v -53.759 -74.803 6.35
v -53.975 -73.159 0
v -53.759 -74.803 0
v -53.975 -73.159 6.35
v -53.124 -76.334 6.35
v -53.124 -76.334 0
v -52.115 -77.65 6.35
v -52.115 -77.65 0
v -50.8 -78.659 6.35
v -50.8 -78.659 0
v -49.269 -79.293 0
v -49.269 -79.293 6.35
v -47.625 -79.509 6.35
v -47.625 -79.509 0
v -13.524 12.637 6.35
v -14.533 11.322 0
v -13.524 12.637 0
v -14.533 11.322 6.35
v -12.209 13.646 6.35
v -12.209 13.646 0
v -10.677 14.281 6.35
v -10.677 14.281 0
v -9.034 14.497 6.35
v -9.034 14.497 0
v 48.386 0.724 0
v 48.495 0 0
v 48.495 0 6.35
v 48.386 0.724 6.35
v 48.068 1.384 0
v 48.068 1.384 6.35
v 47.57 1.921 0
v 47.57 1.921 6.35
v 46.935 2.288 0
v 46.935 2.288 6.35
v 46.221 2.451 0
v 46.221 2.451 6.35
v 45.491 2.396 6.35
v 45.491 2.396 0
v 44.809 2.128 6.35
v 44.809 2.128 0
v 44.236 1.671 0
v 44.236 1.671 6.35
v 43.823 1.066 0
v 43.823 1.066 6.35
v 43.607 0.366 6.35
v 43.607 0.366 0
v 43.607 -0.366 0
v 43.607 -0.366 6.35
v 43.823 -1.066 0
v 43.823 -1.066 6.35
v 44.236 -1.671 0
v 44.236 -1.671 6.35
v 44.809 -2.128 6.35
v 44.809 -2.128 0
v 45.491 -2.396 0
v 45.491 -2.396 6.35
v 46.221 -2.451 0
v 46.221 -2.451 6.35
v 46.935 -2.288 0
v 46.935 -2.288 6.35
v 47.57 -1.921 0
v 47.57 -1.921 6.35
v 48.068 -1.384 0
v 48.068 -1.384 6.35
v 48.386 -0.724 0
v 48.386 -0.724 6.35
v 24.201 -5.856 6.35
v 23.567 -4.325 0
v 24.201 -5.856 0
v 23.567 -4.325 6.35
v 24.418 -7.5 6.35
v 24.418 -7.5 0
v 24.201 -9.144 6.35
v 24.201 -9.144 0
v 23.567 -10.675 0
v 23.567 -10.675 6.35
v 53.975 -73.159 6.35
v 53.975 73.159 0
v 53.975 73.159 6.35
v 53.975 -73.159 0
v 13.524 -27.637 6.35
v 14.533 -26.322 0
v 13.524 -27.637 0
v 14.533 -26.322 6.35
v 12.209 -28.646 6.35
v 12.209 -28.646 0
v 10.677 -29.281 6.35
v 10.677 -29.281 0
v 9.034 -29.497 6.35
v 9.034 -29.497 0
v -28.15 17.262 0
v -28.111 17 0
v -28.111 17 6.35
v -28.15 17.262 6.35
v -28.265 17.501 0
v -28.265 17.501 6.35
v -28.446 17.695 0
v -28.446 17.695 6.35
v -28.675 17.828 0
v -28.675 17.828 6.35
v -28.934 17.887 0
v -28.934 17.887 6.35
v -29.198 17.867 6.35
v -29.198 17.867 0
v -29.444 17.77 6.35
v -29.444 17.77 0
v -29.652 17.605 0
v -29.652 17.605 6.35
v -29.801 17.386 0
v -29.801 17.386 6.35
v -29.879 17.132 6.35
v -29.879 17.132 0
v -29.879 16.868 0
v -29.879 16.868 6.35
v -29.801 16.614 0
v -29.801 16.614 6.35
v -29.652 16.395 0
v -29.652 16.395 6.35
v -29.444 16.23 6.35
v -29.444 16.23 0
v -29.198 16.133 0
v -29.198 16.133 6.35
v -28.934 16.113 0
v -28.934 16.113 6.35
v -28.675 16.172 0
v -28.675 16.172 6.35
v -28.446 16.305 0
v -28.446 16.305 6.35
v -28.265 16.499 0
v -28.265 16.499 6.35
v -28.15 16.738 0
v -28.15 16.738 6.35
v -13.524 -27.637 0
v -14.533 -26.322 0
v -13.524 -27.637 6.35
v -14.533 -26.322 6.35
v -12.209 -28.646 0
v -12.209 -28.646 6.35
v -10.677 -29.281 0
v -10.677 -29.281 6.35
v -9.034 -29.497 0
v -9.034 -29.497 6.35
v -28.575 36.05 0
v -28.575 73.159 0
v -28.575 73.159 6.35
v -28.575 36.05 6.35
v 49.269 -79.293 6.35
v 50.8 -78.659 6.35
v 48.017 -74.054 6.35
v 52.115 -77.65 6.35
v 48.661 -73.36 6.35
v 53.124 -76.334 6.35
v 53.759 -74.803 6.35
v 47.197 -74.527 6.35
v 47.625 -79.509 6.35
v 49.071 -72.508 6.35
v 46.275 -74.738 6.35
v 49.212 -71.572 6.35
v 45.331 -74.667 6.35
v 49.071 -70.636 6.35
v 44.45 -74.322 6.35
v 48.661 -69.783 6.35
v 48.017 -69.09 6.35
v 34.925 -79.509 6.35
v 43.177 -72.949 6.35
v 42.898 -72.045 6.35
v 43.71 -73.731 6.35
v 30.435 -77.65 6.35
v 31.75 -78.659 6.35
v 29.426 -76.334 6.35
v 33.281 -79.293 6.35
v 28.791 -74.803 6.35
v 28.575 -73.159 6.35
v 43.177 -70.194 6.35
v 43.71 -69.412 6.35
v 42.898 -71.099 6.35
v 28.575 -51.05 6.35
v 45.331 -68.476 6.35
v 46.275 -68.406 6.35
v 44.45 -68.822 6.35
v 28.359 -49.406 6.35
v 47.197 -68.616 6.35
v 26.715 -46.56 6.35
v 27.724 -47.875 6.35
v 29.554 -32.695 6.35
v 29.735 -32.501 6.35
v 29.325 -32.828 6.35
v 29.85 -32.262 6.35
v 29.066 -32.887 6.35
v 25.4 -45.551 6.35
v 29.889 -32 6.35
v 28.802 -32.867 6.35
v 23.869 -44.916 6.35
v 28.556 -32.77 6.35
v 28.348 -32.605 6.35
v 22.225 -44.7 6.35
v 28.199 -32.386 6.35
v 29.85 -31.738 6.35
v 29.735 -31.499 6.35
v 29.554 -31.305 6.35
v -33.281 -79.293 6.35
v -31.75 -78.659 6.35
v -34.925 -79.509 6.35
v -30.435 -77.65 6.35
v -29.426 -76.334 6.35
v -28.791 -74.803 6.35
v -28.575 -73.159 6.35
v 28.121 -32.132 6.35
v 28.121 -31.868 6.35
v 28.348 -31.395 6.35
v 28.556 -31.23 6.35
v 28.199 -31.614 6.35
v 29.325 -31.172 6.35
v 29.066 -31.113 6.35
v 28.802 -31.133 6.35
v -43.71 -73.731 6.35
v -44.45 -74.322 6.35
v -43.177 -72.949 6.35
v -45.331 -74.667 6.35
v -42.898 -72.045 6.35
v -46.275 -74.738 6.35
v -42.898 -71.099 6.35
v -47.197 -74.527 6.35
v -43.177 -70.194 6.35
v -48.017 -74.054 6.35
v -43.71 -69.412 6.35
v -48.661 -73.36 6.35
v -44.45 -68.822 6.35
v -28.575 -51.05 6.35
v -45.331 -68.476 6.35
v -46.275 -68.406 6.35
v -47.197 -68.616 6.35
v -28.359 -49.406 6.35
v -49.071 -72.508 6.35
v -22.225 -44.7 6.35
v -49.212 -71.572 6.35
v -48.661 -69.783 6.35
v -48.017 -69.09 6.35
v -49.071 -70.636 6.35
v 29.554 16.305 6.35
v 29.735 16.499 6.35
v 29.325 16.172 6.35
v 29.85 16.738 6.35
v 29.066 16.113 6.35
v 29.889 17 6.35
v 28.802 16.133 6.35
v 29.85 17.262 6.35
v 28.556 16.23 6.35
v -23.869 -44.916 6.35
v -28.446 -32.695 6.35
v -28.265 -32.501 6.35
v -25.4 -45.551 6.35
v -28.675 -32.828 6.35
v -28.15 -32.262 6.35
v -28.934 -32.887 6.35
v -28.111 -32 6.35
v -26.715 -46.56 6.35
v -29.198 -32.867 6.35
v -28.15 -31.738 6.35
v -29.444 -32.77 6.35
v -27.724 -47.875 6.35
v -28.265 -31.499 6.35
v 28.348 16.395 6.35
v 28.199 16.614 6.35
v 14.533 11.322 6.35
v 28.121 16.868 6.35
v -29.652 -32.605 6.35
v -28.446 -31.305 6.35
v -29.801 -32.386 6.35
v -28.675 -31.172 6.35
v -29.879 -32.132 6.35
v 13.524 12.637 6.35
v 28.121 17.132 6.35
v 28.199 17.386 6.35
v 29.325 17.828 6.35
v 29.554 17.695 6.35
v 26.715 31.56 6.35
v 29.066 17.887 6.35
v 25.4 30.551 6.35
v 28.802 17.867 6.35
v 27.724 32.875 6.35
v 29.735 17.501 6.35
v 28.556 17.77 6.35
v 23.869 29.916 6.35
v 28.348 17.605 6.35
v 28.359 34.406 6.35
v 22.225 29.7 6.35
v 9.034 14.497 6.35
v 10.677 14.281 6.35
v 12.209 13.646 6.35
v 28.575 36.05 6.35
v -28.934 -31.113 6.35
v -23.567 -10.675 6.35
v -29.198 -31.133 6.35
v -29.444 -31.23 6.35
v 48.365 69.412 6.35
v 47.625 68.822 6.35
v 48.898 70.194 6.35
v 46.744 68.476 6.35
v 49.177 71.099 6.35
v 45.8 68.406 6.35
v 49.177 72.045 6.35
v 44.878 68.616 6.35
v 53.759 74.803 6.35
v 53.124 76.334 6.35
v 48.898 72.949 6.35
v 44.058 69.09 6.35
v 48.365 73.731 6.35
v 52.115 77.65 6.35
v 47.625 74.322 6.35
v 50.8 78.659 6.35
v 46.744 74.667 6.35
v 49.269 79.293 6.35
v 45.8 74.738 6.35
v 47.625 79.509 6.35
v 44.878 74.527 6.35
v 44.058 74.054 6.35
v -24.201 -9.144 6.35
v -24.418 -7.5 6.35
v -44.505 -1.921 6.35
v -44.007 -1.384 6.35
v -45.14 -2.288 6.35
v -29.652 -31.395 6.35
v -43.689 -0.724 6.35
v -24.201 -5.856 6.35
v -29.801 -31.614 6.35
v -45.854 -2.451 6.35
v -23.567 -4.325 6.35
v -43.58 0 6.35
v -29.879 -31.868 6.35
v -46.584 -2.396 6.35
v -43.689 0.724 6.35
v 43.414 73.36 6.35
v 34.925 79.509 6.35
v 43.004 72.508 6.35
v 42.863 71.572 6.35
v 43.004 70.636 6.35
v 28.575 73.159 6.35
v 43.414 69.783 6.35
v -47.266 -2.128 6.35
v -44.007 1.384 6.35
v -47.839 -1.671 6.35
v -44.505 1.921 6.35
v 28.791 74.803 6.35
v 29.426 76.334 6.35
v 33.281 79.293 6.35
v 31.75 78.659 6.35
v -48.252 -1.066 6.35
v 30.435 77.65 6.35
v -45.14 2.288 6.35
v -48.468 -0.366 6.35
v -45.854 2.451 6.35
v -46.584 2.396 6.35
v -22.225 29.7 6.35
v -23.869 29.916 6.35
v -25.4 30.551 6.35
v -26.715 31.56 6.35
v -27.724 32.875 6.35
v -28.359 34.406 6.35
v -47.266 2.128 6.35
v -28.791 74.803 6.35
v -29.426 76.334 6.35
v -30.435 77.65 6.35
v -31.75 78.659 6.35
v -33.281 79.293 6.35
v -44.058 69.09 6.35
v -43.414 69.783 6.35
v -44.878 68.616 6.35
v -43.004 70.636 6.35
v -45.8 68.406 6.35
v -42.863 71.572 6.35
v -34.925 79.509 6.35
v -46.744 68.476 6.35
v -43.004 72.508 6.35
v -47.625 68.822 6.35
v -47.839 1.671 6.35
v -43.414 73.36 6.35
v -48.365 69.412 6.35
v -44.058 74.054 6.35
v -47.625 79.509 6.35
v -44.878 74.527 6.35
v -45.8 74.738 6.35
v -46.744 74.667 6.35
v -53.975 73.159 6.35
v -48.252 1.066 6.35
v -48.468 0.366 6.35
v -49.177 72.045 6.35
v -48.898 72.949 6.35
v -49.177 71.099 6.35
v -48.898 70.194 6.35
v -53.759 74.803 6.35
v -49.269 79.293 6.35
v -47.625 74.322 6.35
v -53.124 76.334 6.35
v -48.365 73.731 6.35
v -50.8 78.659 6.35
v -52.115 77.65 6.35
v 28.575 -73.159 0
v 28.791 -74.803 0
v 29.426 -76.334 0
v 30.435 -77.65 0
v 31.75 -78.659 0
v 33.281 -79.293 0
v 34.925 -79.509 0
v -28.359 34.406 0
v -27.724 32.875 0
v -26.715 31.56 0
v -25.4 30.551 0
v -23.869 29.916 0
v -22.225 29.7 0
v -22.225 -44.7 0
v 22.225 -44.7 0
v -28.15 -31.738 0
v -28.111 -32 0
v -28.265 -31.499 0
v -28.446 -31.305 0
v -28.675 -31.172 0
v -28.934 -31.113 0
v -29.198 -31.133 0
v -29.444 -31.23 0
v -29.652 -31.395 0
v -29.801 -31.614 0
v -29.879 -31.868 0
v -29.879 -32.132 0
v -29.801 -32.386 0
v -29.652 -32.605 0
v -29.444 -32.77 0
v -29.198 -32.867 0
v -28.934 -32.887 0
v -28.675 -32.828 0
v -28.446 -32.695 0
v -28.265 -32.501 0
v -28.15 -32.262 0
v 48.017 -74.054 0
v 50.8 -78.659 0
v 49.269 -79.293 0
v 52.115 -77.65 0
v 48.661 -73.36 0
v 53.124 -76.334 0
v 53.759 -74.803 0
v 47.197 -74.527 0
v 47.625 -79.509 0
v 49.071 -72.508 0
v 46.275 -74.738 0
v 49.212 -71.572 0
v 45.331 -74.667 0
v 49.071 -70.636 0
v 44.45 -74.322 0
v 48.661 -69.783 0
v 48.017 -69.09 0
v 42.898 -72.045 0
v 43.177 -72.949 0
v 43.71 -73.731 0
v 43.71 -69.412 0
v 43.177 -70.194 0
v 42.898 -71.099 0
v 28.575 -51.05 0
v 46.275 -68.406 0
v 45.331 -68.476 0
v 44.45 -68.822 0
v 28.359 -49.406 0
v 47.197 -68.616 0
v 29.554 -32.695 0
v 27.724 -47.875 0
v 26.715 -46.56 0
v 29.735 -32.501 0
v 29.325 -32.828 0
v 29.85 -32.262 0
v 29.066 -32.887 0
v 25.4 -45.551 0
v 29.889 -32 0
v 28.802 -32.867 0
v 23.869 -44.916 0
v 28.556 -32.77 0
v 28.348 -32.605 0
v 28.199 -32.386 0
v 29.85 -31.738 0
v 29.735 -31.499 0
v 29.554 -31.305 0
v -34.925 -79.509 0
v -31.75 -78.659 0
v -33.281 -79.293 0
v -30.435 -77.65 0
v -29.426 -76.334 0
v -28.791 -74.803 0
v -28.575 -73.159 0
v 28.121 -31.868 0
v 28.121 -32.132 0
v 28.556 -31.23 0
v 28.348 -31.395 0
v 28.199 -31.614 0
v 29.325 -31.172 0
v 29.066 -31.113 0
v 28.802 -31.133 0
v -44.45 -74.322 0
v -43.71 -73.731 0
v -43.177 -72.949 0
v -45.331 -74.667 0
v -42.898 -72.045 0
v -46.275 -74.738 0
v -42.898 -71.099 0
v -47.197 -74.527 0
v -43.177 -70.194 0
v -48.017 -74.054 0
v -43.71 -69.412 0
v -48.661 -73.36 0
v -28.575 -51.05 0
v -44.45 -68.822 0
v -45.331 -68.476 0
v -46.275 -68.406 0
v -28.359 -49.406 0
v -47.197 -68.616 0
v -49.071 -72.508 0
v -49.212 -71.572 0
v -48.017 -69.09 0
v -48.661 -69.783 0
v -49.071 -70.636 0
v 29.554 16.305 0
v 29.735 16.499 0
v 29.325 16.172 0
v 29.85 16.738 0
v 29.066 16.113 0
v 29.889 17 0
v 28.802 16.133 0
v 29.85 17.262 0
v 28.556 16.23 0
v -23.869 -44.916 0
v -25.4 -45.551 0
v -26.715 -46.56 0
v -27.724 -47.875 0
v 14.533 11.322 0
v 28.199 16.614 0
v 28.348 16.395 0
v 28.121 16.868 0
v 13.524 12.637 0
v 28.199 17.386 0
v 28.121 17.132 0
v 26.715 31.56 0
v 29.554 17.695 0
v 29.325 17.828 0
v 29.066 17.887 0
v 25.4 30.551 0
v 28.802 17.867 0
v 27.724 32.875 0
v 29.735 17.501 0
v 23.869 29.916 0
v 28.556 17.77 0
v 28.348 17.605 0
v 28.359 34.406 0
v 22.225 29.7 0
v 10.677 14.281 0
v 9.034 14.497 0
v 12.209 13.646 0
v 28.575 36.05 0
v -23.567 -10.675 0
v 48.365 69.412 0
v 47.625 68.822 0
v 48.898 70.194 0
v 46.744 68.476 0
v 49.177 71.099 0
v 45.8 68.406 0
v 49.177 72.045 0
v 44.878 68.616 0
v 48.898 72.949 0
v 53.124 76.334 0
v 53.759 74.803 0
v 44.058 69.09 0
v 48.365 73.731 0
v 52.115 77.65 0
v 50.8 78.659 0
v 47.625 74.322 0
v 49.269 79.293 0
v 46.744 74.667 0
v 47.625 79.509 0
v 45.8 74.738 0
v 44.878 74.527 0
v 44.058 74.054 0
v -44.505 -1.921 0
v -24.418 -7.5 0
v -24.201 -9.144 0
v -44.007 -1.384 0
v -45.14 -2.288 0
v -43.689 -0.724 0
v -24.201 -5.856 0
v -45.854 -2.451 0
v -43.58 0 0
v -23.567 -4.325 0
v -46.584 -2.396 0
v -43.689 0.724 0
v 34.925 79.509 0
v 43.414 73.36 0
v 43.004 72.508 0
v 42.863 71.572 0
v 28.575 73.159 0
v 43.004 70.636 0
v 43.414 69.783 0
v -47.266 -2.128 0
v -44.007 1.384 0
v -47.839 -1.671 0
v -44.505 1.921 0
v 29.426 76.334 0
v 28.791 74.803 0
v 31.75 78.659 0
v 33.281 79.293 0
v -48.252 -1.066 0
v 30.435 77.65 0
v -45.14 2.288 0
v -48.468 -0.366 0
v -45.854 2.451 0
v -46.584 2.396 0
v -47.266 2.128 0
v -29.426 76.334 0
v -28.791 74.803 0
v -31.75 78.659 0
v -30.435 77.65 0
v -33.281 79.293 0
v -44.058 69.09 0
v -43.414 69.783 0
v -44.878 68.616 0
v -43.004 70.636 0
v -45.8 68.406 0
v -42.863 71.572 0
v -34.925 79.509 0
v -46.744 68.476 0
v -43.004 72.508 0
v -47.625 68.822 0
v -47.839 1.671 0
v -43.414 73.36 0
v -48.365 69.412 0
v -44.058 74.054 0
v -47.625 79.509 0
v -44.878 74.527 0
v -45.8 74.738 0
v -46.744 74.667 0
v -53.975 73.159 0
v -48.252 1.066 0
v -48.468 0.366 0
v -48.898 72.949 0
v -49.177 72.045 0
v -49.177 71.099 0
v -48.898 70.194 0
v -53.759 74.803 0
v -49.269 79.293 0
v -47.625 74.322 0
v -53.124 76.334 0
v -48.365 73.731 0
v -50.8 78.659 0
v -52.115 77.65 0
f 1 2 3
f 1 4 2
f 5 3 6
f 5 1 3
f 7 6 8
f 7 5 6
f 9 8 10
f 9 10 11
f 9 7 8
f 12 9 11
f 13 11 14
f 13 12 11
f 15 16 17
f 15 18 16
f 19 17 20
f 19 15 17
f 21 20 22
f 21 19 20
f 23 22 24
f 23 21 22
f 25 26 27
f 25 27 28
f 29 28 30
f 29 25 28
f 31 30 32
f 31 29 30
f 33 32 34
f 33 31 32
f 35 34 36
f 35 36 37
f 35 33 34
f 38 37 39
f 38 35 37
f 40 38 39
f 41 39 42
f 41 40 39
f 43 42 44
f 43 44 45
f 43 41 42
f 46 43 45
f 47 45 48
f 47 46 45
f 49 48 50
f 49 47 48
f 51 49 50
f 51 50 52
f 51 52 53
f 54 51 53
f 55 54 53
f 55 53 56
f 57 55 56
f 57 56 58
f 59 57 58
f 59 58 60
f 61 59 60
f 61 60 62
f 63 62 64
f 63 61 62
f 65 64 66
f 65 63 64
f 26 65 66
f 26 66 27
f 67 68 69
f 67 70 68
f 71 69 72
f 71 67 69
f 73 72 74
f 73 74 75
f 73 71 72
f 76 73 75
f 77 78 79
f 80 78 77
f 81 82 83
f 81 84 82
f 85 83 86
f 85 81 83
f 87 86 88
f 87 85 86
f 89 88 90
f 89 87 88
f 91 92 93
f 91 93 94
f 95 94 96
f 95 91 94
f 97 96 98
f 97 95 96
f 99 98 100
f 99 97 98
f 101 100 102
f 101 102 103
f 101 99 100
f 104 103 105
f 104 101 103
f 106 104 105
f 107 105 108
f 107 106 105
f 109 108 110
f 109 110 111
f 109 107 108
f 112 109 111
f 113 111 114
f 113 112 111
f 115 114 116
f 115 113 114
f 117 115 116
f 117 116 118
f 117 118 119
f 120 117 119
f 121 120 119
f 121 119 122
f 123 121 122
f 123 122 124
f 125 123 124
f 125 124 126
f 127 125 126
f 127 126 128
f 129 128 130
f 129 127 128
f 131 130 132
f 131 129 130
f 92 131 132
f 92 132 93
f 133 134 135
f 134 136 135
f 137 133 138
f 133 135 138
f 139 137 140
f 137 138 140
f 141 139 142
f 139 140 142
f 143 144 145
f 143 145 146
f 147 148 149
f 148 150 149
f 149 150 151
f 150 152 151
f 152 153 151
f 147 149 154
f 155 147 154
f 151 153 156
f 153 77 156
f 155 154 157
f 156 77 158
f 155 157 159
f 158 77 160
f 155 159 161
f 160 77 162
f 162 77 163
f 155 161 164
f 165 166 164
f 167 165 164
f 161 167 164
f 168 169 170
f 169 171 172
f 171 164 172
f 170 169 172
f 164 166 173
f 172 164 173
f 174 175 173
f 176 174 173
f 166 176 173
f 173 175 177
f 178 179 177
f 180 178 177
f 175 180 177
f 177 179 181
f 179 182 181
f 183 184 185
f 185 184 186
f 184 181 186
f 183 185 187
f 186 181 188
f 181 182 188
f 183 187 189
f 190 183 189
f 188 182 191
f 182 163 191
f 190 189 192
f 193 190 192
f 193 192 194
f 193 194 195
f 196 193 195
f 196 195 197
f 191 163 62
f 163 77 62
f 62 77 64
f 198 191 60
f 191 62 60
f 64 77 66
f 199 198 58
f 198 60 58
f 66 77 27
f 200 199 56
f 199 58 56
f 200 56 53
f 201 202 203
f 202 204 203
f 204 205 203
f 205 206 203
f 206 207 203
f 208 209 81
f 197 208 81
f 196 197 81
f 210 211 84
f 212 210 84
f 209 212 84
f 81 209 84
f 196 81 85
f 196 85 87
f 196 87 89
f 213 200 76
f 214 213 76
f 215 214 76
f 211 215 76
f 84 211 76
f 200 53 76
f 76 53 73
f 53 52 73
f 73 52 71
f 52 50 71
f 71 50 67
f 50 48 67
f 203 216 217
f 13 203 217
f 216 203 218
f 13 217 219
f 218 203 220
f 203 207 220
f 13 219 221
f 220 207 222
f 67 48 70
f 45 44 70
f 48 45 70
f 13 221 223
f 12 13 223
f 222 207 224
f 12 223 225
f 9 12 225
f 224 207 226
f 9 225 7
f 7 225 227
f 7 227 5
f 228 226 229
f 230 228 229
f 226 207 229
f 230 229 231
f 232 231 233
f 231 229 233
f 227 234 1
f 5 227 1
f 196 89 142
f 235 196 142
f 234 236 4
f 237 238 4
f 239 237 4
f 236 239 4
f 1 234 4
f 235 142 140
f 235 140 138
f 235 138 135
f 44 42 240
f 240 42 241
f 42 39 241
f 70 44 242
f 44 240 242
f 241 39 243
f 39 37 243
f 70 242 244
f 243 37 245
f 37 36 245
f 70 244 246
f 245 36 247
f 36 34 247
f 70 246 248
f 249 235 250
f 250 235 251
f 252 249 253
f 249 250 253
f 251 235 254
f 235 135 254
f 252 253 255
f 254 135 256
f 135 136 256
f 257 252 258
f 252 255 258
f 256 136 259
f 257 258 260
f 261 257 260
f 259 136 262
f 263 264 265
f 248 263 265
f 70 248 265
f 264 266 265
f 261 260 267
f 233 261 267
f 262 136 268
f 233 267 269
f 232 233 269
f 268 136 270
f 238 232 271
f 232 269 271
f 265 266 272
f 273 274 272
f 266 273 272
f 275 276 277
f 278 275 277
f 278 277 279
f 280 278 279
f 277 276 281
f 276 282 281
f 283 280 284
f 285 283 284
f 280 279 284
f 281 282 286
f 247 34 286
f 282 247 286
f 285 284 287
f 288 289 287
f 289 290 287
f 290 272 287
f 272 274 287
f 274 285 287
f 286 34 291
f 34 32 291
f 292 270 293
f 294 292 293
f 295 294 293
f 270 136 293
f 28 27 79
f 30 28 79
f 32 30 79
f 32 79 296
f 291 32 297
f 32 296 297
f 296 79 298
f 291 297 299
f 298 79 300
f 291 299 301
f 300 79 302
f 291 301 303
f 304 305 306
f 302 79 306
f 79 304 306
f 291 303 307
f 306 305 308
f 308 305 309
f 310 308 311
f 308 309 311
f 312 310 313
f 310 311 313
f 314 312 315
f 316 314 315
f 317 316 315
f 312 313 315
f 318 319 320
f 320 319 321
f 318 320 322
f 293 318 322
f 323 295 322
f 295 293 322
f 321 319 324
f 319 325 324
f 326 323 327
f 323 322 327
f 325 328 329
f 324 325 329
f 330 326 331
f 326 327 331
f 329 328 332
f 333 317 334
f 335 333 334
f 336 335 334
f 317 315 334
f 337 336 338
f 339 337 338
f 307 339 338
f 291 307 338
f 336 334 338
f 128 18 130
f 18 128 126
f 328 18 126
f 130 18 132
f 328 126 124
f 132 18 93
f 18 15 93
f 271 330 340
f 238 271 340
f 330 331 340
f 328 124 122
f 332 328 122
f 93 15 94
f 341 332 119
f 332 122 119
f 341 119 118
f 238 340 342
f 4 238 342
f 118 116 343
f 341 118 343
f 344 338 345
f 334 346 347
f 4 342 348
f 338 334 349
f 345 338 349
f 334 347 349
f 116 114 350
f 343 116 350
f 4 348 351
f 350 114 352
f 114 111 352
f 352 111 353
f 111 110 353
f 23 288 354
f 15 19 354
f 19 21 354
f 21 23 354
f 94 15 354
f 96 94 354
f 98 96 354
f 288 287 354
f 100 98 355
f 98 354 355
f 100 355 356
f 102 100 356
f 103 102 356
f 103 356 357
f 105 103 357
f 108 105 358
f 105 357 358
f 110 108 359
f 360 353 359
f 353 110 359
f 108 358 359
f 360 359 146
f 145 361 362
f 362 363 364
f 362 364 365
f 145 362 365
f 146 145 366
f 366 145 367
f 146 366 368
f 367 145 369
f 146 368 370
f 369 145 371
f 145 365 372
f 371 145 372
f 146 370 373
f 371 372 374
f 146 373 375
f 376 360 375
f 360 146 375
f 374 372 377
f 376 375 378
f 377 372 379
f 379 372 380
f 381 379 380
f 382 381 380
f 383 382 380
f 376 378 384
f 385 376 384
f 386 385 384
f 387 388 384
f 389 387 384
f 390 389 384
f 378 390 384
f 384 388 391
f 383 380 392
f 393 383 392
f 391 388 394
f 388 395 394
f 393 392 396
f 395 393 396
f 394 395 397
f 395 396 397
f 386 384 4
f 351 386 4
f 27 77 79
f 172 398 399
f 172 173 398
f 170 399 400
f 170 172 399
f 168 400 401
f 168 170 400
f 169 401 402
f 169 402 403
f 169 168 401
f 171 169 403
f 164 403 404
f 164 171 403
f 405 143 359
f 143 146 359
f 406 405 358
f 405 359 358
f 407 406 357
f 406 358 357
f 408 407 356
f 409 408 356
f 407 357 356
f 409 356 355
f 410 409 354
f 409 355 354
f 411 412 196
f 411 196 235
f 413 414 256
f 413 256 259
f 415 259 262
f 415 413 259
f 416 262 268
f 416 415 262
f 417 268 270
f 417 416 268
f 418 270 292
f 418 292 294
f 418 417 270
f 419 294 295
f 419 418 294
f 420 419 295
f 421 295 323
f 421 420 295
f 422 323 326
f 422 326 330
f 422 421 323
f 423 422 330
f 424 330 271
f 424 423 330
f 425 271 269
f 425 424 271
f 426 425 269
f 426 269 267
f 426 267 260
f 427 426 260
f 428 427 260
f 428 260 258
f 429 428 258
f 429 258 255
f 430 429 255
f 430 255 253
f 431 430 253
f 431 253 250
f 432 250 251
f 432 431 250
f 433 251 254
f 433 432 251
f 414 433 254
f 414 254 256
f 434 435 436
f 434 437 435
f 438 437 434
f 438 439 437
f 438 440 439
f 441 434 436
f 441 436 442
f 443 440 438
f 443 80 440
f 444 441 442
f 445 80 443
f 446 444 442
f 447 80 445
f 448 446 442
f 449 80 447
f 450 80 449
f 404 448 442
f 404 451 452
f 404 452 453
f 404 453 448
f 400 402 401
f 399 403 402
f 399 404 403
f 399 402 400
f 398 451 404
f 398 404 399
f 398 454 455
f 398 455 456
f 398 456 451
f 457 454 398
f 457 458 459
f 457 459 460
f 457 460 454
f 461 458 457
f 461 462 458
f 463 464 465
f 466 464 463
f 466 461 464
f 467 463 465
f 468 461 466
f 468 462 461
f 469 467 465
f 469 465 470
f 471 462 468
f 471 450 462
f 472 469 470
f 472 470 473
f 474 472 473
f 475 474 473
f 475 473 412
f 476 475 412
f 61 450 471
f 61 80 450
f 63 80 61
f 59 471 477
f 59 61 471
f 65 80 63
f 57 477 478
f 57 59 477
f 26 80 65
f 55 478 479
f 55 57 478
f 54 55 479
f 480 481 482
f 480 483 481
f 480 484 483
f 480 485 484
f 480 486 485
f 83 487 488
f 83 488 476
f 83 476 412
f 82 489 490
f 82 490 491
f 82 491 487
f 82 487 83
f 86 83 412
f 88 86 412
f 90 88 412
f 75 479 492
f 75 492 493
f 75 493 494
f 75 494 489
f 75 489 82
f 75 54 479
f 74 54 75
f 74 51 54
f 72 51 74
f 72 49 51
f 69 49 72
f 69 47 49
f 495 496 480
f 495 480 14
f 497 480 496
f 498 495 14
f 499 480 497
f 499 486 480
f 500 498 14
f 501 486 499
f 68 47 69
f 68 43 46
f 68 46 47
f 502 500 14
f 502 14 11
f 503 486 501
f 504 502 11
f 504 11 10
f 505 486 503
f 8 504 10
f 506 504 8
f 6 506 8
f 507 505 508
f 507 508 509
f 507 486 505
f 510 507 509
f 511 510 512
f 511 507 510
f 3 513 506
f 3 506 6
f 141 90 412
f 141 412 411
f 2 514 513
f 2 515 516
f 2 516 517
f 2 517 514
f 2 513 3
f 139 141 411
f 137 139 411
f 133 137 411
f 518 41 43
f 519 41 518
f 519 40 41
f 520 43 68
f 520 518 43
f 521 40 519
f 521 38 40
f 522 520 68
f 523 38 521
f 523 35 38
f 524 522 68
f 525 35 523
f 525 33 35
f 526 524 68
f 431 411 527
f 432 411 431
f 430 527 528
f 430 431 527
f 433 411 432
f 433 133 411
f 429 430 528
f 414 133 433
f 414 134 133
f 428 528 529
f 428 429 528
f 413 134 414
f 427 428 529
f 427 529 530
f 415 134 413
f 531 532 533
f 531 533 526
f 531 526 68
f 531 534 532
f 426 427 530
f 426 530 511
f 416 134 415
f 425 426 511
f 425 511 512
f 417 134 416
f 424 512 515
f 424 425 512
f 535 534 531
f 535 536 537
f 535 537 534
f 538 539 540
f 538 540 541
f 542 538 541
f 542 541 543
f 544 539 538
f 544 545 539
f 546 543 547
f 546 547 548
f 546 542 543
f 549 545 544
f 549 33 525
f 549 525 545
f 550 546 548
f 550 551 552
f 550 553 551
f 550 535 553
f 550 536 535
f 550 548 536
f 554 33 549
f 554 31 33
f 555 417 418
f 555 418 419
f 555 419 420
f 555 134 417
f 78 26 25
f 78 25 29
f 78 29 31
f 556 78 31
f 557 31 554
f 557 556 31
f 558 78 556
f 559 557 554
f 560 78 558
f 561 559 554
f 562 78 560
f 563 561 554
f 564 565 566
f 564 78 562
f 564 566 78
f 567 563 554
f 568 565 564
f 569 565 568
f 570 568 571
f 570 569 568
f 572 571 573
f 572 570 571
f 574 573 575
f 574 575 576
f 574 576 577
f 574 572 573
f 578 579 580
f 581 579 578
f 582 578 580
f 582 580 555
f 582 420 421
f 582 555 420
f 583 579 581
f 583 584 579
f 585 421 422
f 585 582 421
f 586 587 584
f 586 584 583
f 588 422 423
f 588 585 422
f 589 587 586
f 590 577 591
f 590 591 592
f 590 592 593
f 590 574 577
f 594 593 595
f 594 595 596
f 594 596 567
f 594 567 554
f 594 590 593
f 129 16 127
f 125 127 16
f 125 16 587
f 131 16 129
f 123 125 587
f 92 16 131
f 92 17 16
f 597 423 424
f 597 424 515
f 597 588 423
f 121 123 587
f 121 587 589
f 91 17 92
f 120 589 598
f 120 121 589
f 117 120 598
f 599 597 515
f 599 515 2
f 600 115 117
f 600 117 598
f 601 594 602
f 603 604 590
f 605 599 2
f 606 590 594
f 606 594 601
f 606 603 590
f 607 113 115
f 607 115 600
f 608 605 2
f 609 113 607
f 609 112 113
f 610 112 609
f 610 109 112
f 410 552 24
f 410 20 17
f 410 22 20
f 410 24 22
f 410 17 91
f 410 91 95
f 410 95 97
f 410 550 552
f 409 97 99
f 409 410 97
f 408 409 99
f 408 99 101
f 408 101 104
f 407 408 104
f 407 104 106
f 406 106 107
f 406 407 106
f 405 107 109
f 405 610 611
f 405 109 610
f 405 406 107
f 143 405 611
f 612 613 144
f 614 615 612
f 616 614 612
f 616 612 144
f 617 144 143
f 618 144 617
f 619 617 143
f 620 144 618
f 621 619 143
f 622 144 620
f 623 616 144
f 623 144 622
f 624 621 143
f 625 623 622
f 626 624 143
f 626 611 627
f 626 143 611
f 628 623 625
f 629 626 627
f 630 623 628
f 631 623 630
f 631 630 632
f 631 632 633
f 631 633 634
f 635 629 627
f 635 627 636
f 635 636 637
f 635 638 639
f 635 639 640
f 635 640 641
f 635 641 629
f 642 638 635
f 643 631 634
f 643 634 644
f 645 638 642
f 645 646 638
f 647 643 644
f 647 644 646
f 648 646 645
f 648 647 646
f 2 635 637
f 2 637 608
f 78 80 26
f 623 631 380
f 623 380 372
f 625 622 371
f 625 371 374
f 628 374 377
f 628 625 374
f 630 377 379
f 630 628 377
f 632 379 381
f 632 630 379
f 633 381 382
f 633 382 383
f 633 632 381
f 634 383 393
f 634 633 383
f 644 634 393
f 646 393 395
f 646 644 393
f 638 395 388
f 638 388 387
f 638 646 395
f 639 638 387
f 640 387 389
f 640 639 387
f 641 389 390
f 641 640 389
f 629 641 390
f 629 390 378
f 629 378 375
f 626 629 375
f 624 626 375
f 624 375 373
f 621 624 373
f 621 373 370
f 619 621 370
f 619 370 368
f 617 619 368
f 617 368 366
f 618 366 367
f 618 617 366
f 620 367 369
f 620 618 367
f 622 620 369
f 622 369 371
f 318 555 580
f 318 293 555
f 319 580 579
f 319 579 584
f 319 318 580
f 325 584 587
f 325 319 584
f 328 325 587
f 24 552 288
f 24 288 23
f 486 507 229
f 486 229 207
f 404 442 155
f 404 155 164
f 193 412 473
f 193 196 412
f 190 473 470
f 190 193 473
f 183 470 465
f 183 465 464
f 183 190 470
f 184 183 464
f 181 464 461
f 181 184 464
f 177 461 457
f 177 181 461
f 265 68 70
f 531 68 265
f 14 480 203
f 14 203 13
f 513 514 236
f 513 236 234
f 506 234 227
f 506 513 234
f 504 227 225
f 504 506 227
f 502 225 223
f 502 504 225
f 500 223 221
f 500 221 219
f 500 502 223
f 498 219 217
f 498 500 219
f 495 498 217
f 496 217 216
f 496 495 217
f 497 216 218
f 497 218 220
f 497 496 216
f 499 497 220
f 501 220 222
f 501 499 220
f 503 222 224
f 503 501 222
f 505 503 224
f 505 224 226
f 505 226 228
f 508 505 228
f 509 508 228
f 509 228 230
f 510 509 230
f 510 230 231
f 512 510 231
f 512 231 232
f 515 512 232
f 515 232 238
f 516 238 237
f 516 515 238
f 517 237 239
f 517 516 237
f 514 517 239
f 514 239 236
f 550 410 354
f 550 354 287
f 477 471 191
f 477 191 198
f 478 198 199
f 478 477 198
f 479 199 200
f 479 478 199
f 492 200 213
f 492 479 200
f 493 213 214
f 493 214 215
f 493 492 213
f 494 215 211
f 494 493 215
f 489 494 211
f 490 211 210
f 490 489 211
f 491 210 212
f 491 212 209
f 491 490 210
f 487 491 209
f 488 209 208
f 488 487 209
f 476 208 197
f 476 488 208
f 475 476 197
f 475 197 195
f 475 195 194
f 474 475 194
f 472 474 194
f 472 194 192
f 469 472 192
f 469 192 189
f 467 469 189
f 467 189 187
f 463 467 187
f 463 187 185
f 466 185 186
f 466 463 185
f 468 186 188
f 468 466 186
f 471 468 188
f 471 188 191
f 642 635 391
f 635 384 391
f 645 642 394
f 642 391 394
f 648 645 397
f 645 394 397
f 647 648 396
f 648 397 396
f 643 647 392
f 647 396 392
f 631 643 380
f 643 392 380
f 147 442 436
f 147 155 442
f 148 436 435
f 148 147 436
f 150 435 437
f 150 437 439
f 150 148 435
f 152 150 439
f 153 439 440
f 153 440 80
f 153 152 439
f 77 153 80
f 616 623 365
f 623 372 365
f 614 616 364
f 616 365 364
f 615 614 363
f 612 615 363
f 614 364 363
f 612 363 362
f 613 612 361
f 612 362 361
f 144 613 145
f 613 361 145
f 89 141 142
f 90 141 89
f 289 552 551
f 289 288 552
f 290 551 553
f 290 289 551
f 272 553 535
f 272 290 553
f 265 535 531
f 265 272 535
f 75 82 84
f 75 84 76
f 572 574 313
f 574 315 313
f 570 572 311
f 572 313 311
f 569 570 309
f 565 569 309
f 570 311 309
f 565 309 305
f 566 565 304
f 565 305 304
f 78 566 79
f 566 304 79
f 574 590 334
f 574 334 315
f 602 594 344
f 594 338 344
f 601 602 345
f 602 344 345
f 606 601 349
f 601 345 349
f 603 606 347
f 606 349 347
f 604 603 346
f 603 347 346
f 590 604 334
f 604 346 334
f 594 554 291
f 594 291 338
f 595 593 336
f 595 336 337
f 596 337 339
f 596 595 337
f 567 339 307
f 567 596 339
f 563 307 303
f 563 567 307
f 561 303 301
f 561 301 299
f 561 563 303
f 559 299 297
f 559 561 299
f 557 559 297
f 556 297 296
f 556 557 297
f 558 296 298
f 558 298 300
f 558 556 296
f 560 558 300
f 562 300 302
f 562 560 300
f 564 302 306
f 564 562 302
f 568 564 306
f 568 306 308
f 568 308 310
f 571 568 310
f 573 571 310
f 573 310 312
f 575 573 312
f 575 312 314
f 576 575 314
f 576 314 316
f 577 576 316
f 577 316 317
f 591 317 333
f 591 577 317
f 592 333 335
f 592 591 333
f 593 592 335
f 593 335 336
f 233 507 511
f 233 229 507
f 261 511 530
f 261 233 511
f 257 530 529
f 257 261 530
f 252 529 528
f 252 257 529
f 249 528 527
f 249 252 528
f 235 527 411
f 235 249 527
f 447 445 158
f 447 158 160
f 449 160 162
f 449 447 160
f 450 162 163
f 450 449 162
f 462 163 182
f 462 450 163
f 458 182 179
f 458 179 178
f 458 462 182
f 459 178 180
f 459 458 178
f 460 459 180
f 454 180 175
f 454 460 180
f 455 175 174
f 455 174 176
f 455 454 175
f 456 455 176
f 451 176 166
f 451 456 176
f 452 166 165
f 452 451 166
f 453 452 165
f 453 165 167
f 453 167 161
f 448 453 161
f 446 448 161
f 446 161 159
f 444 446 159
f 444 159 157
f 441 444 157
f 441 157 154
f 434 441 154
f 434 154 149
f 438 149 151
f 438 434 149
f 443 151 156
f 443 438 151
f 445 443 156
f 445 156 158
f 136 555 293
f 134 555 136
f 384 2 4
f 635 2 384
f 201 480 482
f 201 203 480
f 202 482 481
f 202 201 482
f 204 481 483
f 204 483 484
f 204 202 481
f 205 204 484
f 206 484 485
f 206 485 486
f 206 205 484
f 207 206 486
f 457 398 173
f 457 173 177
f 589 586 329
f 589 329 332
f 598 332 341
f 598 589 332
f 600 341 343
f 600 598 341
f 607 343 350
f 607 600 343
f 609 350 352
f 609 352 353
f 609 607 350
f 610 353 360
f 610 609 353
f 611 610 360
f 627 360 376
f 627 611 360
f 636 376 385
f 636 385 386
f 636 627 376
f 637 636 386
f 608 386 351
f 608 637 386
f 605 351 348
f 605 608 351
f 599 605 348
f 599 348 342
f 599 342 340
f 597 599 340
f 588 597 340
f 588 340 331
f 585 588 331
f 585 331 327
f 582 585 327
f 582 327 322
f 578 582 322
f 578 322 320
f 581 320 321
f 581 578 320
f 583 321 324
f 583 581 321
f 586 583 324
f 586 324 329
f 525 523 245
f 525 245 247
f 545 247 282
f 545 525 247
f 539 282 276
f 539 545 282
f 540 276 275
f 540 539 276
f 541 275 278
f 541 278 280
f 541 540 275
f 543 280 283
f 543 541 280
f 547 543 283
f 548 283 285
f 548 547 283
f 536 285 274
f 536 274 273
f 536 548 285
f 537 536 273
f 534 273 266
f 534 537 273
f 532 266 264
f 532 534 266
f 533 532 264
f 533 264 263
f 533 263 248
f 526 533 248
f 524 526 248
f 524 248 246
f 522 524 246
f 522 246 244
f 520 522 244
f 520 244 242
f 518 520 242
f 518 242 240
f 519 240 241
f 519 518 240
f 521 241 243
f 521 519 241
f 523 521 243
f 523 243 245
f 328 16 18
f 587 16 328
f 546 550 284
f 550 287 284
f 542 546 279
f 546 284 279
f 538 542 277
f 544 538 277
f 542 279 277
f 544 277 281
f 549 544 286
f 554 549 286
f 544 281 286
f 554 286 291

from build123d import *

# Parameters (mm, degrees)
SKETCH1_R           = 0.889
SKETCH1_R_2         = 3.175
SKETCH1_R_3         = 2.45745
BOSS_EXTRUDE1_DEPTH = 6.35
FILLET3_R           = 6.35


with BuildPart() as part:
    # Sketch1 → Boss-Extrude1 (new body)
    with BuildSketch(Plane.XY):
        Polygon((-53.975, -79.509375), (-53.975, 79.509375), (-28.575, 79.509375), (-28.575, 29.7), (28.575, 29.7), (28.575, 79.509375), (53.975, 79.509375), (53.975, -79.509375), (28.575, -79.509375), (28.575, -44.7), (-28.575, -44.7), (-28.575, -79.509375), align=None)
        with Locations((29, 17)):
            Circle(SKETCH1_R, mode=Mode.SUBTRACT)
        with Locations((29, -32)):
            Circle(SKETCH1_R, mode=Mode.SUBTRACT)
        with Locations((-29, -32)):
            Circle(SKETCH1_R, mode=Mode.SUBTRACT)
        with Locations((-29, 17)):
            Circle(SKETCH1_R, mode=Mode.SUBTRACT)
        with Locations((-46.0375, 71.571875)):
            Circle(SKETCH1_R_2, mode=Mode.SUBTRACT)
        with Locations(Location((46.0375, 71.571875, 0), (0, 0, 180))):
            Circle(SKETCH1_R_2, mode=Mode.SUBTRACT)
        with Locations(Location((-46.0375, -71.571875, 0), (0, 0, 180))):
            Circle(SKETCH1_R_2, mode=Mode.SUBTRACT)
        with Locations((46.0375, -71.571875)):
            Circle(SKETCH1_R_2, mode=Mode.SUBTRACT)
        with Locations((-46.0375, 0)):
            Circle(SKETCH1_R_3, mode=Mode.SUBTRACT)
        with Locations((46.0375, 0)):
            Circle(SKETCH1_R_3, mode=Mode.SUBTRACT)
        Polygon((-12.7, -29.497045256), (12.7, -29.497045256), (25.4, -7.5), (12.7, 14.497045256), (-12.7, 14.497045256), (-25.4, -7.5), align=None, mode=Mode.SUBTRACT)
    extrude(amount=BOSS_EXTRUDE1_DEPTH)

    # Fillet3
    fillet3_edges = [part.edges().sort_by_distance(p)[0] for p in [
        (-53.975, -79.509375, 3.175),
        (-53.975, 79.509375, 3.175),
        (-28.575, 79.509375, 3.175),
        (-28.575, 29.7, 3.175),
        (28.575, 29.7, 3.175),
        (28.575, 79.509375, 3.175),
        (53.975, 79.509375, 3.175),
        (53.975, -79.509375, 3.175),
        (28.575, -79.509375, 3.175),
        (28.575, -44.7, 3.175),
        (-28.575, -44.7, 3.175),
        (-28.575, -79.509375, 3.175),
        (-25.4, -7.5, 3.175),
        (-12.7, -29.497045256, 3.175),
        (12.7, -29.497045256, 3.175),
        (25.4, -7.5, 3.175),
        (12.7, 14.497045256, 3.175),
        (-12.7, 14.497045256, 3.175),
    ]]
    fillet(fillet3_edges, radius=FILLET3_R)


solid = part.part
